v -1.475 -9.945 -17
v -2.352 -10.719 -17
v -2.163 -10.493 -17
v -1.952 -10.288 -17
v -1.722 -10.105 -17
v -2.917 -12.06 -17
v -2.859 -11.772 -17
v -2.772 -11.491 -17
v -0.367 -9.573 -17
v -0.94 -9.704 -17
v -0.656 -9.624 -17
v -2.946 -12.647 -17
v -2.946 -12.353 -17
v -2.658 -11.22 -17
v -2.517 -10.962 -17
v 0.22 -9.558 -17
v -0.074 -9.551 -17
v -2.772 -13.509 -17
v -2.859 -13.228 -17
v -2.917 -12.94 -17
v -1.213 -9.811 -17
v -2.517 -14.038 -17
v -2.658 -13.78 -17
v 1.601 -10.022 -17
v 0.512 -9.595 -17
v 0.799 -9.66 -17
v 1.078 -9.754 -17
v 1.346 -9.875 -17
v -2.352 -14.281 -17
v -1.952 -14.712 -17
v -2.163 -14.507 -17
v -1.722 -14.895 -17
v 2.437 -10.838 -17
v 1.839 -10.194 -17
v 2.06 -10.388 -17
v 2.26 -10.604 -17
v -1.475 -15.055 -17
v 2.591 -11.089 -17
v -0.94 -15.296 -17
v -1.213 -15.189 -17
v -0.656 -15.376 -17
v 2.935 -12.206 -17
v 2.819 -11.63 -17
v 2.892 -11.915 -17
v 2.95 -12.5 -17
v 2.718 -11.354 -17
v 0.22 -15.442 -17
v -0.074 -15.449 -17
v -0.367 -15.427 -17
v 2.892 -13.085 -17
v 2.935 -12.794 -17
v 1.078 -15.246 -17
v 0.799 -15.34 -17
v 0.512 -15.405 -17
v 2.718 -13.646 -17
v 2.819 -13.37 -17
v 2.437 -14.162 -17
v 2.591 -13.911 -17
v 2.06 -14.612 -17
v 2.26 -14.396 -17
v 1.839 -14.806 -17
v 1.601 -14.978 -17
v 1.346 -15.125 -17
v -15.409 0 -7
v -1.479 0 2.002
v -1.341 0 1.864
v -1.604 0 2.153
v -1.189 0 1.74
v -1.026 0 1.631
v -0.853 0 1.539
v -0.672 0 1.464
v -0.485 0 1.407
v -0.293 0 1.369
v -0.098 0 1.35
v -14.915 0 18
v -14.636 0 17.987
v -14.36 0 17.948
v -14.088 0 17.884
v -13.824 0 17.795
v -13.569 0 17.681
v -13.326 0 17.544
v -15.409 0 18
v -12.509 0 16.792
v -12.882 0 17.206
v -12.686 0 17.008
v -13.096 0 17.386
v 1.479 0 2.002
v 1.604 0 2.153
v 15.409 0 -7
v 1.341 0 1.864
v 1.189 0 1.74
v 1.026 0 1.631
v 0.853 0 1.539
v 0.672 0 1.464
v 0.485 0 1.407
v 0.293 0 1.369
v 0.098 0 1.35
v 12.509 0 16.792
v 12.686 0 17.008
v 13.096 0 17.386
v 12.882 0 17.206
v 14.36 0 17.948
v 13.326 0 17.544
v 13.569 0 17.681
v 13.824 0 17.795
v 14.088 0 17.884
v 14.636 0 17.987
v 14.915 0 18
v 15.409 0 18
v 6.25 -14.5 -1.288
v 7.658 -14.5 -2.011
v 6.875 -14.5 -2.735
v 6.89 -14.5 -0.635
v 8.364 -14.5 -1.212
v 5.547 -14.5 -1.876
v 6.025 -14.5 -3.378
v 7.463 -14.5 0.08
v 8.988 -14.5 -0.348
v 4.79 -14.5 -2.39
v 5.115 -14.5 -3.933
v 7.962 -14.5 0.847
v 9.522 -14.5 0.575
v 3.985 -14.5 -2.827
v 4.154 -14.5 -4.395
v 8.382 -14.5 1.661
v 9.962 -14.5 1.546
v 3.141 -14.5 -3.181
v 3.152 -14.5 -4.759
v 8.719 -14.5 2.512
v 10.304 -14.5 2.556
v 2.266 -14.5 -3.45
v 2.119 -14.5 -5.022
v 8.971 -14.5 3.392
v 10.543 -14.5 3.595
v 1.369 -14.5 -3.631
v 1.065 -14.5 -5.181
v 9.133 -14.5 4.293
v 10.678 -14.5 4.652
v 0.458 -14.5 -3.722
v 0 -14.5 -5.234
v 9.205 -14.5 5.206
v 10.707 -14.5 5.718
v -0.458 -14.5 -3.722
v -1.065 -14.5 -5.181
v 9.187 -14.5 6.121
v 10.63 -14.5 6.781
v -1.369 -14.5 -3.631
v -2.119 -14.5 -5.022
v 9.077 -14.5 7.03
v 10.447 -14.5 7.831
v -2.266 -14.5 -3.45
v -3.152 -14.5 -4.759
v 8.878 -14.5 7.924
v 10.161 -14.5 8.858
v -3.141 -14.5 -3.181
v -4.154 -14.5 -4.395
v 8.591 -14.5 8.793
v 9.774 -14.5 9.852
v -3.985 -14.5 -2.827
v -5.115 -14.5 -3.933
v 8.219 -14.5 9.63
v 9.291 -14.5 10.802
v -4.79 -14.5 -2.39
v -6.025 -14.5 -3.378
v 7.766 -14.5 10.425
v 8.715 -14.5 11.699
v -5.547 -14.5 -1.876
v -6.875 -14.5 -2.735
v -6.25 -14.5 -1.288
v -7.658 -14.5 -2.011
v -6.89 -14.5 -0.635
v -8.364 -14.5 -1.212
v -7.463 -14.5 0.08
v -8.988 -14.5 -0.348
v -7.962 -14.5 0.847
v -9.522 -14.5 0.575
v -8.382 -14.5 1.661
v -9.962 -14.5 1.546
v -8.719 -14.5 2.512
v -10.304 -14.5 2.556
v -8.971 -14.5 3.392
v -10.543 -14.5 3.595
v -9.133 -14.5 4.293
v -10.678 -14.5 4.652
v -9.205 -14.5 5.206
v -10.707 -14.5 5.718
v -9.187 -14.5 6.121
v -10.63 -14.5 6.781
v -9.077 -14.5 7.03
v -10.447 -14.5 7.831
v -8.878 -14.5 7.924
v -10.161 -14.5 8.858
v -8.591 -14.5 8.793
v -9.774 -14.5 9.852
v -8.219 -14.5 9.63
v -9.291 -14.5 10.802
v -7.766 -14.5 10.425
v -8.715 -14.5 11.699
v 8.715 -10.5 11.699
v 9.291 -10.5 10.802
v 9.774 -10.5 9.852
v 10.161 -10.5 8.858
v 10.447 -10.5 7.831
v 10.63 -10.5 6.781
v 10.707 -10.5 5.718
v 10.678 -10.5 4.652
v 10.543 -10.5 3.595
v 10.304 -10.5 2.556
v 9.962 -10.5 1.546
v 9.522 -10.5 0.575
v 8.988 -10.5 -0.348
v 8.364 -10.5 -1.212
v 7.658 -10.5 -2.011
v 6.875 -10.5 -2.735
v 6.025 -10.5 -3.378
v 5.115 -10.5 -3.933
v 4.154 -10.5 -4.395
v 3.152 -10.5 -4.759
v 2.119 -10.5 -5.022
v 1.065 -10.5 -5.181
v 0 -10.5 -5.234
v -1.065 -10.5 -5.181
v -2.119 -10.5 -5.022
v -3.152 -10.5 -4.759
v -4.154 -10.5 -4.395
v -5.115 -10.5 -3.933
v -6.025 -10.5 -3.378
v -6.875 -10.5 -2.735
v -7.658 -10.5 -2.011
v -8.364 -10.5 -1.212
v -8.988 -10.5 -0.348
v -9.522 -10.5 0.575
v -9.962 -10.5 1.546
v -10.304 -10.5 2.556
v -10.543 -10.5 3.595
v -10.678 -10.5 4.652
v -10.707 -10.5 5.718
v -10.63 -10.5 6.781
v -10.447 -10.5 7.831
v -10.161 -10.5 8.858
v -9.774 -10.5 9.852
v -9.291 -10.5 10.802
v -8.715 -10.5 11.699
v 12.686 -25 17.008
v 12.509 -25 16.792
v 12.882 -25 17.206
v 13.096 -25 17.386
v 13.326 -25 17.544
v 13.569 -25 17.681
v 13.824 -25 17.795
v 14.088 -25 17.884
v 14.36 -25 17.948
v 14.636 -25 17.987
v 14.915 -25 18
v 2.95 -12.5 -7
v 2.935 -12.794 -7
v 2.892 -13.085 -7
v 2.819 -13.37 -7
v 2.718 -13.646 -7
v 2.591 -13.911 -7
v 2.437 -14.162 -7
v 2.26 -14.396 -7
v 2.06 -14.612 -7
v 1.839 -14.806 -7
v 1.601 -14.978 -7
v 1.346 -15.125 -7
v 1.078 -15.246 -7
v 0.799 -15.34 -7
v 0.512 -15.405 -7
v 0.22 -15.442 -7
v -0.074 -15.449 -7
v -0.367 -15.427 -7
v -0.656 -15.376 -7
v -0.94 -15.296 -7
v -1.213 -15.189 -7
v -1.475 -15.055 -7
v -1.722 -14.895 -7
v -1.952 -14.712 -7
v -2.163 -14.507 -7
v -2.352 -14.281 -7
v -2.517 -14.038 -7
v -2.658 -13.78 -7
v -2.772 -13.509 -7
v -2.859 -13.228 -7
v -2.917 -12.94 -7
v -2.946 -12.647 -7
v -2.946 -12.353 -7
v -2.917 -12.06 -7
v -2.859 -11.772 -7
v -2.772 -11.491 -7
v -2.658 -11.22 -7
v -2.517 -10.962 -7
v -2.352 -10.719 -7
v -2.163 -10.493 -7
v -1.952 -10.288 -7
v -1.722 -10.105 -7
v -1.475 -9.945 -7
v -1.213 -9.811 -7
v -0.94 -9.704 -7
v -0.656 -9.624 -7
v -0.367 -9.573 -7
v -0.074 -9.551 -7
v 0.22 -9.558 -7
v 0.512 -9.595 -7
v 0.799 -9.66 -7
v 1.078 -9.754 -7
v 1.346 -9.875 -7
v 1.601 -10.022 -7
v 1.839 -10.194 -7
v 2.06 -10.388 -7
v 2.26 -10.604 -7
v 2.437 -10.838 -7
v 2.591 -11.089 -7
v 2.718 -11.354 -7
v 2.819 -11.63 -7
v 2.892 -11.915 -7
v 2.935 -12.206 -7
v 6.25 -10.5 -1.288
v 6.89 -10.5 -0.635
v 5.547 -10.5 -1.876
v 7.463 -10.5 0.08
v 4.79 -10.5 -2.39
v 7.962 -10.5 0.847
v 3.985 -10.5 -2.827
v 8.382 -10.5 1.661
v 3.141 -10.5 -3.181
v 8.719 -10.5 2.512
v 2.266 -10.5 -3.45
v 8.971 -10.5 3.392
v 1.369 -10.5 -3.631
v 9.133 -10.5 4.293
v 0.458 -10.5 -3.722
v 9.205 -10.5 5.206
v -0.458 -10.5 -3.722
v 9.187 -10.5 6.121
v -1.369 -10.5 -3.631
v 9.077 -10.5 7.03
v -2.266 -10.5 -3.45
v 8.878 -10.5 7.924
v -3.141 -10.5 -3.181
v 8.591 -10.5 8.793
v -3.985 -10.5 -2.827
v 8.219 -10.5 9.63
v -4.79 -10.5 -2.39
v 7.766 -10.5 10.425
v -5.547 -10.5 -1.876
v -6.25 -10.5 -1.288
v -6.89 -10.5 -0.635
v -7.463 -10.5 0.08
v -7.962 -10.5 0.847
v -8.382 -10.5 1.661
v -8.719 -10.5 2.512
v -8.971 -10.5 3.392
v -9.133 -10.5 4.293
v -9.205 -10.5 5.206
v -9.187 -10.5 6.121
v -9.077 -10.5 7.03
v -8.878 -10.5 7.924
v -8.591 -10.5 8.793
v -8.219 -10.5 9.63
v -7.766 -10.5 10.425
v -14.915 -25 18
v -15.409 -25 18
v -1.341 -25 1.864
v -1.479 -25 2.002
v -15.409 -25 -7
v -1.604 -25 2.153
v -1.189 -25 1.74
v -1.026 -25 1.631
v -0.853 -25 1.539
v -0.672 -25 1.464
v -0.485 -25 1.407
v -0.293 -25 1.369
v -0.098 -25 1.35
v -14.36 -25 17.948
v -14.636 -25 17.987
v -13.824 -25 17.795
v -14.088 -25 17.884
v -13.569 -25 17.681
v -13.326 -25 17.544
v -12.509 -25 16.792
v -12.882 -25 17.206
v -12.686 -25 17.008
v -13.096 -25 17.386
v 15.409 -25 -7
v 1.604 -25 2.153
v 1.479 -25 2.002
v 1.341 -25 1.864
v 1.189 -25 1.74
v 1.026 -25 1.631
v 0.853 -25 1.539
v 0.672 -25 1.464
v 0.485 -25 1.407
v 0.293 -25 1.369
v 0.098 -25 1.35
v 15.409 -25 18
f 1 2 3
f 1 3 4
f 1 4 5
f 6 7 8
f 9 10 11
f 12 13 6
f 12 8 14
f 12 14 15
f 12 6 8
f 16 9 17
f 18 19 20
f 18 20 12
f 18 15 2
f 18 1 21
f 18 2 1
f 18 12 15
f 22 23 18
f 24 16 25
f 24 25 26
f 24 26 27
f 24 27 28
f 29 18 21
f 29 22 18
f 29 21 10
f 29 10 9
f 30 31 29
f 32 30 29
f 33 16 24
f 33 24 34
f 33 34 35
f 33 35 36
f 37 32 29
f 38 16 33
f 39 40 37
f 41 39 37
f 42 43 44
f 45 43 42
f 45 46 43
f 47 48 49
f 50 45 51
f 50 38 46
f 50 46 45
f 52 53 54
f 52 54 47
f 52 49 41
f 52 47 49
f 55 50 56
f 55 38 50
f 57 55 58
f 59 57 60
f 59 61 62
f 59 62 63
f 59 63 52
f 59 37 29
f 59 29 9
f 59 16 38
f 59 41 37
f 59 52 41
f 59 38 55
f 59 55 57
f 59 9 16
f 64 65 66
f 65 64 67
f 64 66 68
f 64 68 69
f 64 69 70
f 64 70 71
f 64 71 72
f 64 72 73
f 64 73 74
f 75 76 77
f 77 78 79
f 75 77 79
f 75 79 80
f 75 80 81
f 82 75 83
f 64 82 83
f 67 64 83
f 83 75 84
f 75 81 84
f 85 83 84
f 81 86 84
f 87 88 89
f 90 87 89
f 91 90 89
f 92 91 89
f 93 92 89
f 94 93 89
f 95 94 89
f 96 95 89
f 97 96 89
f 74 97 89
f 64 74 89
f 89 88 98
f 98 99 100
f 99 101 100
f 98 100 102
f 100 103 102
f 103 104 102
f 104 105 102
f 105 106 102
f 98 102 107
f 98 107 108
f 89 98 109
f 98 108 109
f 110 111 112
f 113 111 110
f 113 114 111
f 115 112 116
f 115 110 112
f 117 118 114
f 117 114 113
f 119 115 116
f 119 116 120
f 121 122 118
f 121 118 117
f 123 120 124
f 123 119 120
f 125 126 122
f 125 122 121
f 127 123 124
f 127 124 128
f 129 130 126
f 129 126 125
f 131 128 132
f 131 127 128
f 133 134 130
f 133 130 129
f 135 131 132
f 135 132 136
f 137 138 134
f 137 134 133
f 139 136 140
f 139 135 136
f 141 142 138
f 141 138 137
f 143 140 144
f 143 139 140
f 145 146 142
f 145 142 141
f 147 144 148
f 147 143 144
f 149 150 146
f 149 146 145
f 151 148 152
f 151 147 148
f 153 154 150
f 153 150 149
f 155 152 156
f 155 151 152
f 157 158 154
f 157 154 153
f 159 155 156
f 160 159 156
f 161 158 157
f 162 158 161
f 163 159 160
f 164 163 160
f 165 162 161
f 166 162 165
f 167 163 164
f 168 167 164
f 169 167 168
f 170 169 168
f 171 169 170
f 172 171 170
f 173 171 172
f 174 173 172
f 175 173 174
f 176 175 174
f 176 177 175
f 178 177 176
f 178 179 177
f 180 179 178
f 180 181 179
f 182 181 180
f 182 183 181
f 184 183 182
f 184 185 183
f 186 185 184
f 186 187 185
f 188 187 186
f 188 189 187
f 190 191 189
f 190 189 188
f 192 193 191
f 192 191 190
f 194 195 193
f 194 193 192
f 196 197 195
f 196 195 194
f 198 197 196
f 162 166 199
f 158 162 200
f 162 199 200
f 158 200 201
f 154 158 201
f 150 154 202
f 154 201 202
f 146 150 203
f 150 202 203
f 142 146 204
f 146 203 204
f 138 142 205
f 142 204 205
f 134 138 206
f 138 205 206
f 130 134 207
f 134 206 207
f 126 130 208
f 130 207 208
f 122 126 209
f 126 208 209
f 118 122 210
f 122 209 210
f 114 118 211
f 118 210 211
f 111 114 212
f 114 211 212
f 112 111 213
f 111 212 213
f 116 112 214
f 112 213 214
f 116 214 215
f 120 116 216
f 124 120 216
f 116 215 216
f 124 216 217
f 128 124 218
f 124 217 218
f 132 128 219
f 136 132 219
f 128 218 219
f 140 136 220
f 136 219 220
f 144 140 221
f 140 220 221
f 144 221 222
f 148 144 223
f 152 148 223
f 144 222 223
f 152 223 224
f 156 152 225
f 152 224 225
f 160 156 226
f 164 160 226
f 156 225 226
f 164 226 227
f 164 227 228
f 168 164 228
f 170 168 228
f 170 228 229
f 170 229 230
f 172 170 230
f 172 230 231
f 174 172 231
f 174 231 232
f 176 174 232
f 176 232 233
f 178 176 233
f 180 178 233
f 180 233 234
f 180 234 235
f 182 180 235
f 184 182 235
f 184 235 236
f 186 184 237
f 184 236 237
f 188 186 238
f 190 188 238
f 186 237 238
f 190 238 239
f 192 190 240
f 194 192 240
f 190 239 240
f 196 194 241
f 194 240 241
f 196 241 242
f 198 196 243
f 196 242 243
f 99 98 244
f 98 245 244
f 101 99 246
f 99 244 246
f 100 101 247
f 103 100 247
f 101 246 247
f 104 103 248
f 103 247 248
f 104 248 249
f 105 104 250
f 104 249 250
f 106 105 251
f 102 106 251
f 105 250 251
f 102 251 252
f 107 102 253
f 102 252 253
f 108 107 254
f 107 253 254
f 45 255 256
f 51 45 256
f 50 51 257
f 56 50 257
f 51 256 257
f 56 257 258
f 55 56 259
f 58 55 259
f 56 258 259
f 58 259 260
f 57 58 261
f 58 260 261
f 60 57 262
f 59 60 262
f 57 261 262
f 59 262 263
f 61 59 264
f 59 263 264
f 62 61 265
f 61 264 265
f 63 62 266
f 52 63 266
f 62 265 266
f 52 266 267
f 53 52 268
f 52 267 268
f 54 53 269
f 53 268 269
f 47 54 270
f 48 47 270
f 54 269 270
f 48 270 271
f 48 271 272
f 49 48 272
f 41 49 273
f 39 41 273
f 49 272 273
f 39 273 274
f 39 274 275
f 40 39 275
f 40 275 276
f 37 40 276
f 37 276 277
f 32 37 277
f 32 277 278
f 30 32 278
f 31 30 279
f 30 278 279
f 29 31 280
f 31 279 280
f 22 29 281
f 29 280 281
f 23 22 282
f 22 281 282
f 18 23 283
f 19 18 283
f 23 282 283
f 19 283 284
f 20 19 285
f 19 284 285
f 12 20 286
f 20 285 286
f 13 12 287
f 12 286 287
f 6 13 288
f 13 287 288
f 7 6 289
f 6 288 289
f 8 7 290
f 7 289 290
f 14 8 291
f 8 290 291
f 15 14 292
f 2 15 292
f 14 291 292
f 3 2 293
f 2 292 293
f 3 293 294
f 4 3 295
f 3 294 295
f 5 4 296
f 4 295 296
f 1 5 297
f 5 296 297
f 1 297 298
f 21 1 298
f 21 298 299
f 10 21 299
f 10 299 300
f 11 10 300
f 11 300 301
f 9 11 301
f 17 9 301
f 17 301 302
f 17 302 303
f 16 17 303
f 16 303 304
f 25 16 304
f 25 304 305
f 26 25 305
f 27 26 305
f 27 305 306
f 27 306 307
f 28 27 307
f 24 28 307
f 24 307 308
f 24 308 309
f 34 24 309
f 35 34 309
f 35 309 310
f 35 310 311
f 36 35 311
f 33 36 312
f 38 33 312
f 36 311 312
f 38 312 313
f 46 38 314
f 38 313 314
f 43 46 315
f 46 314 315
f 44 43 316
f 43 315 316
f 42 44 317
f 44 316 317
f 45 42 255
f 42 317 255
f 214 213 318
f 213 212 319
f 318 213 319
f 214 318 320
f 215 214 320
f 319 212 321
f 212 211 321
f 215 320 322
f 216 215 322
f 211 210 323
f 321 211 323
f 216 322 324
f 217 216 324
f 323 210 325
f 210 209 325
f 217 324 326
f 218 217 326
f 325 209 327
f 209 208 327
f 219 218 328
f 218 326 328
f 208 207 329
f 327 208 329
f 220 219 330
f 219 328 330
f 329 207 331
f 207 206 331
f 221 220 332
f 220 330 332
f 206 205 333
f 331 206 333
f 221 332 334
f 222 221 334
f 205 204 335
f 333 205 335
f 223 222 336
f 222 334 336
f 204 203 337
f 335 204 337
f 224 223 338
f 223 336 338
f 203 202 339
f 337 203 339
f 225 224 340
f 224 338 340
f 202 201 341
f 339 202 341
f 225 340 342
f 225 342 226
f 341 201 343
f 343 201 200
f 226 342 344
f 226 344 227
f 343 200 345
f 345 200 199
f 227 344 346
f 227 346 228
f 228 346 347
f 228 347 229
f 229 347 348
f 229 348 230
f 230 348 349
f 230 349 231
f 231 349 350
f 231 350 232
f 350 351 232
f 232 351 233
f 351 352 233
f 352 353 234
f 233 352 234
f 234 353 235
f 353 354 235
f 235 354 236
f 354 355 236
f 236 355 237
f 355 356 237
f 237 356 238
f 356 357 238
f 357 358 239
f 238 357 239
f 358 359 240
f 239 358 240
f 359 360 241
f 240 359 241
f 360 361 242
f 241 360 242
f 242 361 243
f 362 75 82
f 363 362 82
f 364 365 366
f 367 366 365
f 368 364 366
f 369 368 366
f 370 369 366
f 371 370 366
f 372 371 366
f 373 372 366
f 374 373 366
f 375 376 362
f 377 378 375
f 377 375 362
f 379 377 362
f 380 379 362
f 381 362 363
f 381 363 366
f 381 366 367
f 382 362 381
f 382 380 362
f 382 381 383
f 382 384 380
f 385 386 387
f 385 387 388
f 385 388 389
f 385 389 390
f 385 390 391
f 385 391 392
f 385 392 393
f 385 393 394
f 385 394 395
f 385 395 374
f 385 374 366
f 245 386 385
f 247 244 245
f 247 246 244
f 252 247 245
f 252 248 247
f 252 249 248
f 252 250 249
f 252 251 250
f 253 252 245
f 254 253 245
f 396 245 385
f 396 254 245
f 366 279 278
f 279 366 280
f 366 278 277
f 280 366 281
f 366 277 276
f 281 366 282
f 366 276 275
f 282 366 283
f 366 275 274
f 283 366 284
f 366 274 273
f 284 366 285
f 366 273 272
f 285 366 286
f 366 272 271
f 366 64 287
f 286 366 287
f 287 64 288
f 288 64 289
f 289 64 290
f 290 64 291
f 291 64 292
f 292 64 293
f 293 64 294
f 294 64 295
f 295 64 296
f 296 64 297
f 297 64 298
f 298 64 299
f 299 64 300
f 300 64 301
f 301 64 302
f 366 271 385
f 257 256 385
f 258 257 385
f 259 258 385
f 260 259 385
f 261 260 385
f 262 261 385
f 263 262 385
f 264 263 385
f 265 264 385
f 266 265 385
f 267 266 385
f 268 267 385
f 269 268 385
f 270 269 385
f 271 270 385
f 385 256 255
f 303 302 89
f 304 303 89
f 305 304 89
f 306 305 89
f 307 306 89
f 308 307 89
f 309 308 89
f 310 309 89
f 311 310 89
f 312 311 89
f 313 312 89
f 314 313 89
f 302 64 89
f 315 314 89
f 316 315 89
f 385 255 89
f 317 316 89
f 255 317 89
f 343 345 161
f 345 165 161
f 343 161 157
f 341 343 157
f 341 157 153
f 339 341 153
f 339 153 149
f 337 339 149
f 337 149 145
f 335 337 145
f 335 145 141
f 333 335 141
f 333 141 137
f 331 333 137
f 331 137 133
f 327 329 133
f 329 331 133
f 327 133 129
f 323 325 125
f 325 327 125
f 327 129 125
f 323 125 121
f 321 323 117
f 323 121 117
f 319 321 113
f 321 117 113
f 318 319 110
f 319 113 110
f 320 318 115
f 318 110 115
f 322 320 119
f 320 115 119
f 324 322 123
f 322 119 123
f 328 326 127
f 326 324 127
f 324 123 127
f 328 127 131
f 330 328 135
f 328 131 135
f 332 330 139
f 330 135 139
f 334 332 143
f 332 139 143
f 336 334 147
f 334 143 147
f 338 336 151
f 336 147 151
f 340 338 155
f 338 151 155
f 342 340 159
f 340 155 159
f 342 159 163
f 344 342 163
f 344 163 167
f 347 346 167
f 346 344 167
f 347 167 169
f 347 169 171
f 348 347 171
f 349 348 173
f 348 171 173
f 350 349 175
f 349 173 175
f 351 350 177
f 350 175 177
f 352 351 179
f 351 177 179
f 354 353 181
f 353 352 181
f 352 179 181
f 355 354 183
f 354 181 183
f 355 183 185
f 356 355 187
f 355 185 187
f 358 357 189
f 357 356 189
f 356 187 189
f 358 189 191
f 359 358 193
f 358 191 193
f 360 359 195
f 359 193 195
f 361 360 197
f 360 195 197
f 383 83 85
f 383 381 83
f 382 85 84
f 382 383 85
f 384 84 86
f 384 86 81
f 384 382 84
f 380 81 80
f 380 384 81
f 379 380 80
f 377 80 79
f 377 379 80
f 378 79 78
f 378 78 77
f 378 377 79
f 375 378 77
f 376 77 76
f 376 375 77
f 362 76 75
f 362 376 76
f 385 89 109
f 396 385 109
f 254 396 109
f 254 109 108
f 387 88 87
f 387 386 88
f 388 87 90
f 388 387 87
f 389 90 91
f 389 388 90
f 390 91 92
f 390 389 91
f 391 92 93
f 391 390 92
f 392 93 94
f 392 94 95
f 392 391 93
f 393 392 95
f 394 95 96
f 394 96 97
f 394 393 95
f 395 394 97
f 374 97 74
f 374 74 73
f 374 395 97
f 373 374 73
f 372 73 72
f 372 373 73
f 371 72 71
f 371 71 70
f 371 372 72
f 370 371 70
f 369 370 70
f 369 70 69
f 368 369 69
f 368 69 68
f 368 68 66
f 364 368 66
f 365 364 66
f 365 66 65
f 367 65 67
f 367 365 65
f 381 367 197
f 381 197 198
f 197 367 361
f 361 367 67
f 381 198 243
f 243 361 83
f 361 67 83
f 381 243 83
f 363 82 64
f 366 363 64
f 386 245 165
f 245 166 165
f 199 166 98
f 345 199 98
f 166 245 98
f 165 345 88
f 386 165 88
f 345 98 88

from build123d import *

# Parameters (mm, degrees)
F1_DEPTH = 25
F2_R     = 2.95
F3_DEPTH = 10
F4_R     = 3
F5_R     = 2
F8_R     = 10.709349
F8_R_2   = 9.209349
F9_DEPTH = 2


with BuildPart() as f1:
    # F0 (on Front) → F1 (new body)
    with BuildSketch(Plane.XZ):
        Polygon((13.40901, 18), (0, 0), (-13.40901, 18), (-15.40901, 18), (-15.40901, -7), (15.40901, -7), (15.40901, 18), align=None)
    extrude(amount=F1_DEPTH)

    # F2 (on face) → F3 (join)
    with BuildSketch(Plane(origin=(0, 0, -7), x_dir=(1, 0, 0), z_dir=(0, 0, -1))):
        with Locations((0, 12.5)):
            Circle(F2_R)
    extrude(amount=F3_DEPTH)

    # F4
    f4_edges = [f1.edges().sort_by_distance(p)[0] for p in [
        (-13.40901, -12.5, 18),
        (13.40901, -12.5, 18),
    ]]
    fillet(f4_edges, radius=F4_R)

    # F5
    f5_edges = [f1.edges().sort_by_distance(p)[0] for p in [
        (0, -12.5, 0),
    ]]
    fillet(f5_edges, radius=F5_R)

    # F8 (on face) → F9 (cut, symmetric)
    with BuildSketch(Plane(origin=(0, -12.5, 0), x_dir=(-1, 0, 0), z_dir=(0, 1, 0))):
        with Locations((0, 5.47572)):
            Circle(F8_R)
        with Locations((0, 5.47572)):
            Circle(F8_R_2, mode=Mode.SUBTRACT)
    extrude(amount=F9_DEPTH, both=True, mode=Mode.SUBTRACT)


solid = f1.part
